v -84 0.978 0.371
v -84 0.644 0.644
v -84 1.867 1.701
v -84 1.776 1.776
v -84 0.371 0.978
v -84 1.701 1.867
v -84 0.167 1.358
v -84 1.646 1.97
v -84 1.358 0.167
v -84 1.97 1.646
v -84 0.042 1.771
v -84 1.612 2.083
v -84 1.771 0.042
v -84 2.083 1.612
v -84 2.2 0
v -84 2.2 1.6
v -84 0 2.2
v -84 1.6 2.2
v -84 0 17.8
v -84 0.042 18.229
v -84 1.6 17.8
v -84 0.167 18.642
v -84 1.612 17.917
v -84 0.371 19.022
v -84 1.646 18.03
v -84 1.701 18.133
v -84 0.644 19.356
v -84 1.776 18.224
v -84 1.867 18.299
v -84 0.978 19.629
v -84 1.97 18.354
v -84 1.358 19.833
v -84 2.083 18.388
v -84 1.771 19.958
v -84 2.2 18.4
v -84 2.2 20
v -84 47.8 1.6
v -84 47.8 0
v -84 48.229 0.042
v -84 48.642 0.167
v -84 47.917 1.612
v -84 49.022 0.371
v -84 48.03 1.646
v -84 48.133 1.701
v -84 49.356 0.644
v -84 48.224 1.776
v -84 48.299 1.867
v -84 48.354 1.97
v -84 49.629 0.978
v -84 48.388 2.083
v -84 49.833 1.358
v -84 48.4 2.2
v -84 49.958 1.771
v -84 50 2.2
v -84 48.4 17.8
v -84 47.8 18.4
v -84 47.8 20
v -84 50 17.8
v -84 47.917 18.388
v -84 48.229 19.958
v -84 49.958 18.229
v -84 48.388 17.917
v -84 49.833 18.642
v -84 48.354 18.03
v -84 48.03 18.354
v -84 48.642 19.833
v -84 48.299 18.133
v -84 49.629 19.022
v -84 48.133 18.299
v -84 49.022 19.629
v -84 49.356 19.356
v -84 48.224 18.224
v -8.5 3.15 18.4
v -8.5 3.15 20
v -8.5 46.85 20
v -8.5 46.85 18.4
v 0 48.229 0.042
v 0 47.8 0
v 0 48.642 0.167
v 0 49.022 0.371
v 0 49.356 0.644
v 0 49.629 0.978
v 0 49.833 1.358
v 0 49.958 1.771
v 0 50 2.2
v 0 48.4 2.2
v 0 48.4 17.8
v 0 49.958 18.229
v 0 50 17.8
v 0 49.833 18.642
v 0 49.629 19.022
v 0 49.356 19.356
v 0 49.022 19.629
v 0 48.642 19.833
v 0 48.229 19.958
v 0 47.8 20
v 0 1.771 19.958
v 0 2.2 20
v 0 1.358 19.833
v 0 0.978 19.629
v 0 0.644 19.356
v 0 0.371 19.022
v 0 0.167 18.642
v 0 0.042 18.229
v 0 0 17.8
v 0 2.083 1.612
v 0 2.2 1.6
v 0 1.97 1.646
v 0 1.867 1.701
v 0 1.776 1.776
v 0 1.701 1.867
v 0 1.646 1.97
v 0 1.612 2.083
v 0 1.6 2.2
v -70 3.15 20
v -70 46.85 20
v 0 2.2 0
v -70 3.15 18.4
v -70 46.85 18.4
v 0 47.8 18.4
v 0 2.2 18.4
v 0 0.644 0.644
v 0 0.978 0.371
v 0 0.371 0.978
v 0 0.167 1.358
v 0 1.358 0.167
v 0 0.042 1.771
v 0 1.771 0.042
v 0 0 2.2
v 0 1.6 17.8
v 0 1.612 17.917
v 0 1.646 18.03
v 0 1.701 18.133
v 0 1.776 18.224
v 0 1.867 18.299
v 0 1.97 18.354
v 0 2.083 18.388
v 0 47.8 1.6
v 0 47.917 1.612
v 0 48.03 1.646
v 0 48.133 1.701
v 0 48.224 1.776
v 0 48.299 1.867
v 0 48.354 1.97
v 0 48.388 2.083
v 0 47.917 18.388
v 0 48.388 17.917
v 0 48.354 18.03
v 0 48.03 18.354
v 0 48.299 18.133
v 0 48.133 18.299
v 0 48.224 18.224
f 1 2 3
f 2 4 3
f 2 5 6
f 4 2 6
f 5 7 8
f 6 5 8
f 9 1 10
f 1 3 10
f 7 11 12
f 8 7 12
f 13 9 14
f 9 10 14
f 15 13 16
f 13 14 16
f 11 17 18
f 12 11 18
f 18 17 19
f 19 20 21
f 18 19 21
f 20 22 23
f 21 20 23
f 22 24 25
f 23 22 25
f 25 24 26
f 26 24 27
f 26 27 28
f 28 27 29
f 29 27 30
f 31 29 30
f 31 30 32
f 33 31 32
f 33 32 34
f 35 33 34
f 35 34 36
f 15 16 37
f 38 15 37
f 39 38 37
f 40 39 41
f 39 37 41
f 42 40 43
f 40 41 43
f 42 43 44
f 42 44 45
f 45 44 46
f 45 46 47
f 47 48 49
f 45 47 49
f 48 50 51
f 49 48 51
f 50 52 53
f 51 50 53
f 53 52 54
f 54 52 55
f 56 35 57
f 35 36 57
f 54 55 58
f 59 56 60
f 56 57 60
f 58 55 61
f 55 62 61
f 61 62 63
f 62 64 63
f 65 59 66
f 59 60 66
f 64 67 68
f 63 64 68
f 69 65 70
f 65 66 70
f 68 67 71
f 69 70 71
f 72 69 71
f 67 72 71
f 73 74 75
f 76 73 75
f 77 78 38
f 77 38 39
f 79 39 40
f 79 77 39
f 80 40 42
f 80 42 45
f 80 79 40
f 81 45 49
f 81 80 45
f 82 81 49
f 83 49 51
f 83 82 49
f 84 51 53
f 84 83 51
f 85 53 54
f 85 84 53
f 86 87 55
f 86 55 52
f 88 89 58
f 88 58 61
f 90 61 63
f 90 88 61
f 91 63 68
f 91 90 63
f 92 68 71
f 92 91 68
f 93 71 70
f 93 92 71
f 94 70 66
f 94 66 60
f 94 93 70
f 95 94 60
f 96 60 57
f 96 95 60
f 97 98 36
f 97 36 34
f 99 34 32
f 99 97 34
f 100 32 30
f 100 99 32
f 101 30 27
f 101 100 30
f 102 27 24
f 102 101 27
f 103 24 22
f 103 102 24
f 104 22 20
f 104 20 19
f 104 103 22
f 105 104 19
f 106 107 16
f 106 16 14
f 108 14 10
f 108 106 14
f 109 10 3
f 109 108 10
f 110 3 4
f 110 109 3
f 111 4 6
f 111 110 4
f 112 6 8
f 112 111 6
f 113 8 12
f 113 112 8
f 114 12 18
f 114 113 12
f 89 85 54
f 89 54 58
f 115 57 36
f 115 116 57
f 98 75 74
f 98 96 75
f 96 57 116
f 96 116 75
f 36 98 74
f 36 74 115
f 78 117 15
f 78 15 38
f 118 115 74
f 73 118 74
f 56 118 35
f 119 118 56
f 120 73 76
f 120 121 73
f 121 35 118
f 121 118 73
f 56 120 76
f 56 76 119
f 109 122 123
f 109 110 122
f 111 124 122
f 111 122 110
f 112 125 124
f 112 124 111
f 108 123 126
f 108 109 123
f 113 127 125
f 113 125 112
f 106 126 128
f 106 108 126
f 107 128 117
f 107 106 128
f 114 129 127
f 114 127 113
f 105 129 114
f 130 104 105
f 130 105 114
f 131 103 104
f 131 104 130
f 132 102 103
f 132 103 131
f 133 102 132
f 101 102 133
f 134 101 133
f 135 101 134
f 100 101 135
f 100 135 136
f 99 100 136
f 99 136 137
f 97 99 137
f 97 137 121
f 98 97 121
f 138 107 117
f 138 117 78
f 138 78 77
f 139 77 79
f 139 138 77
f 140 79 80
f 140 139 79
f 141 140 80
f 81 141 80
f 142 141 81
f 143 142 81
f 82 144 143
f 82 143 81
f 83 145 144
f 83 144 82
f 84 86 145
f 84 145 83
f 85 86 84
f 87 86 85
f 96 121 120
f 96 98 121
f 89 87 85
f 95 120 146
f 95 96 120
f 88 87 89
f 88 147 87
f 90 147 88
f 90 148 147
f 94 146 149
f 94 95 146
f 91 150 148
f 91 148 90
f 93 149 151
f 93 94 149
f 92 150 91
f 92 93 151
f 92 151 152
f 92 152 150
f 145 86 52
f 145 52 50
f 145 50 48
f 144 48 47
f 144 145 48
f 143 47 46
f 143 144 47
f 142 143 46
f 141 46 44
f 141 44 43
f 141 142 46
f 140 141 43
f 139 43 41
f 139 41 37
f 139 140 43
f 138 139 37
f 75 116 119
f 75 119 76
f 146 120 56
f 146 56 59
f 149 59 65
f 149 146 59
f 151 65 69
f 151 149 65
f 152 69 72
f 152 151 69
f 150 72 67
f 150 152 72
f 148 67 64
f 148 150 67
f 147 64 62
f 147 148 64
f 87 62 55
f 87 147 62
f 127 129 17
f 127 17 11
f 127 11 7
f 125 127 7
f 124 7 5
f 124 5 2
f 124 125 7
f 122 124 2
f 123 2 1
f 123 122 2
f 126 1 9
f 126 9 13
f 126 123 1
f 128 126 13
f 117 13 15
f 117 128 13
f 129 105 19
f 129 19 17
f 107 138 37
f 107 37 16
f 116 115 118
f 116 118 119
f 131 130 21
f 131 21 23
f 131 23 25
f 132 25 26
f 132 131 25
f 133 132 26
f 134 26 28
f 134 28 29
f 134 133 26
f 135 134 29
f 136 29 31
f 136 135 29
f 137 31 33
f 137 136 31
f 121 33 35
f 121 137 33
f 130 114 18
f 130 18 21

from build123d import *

# Parameters (mm, degrees)
F1_DEPTH = 84
F2_W     = 61.5
F2_H     = 43.7
F3_DEPTH = 1.6


with BuildPart() as f1:
    # F0 (on Right) → F1 (new body)
    with BuildSketch(Plane.YZ):
        with BuildLine():
            Line((47.8, 20), (2.2, 20))
            ThreePointArc((2.2, 20), (0.644365, 19.355635), (0, 17.8))
            Line((0, 17.8), (0, 2.2))
            ThreePointArc((0, 2.2), (0.644365, 0.644365), (2.2, 0))
            Line((2.2, 0), (47.8, 0))
            ThreePointArc((47.8, 0), (49.355635, 0.644365), (50, 2.2))
            Line((50, 2.2), (50, 17.8))
            ThreePointArc((50, 17.8), (49.355635, 19.355635), (47.8, 20))
        make_face()
        with BuildLine():
            ThreePointArc((47.8, 18.4), (48.224264, 18.224264), (48.4, 17.8))
            Line((48.4, 17.8), (48.4, 2.2))
            ThreePointArc((48.4, 2.2), (48.224264, 1.775736), (47.8, 1.6))
            Line((47.8, 1.6), (2.2, 1.6))
            ThreePointArc((2.2, 1.6), (1.775736, 1.775736), (1.6, 2.2))
            Line((1.6, 2.2), (1.6, 17.8))
            ThreePointArc((1.6, 17.8), (1.775736, 18.224264), (2.2, 18.4))
            Line((2.2, 18.4), (47.8, 18.4))
        make_face(mode=Mode.SUBTRACT)
    extrude(amount=-F1_DEPTH)

    # F2 (on face) → F3 (cut, through all)
    with BuildSketch(Plane.XY.offset(20)):
        with Locations((-39.25, 25)):
            Rectangle(F2_W, F2_H)
    extrude(amount=-F3_DEPTH, mode=Mode.SUBTRACT)


solid = f1.part
